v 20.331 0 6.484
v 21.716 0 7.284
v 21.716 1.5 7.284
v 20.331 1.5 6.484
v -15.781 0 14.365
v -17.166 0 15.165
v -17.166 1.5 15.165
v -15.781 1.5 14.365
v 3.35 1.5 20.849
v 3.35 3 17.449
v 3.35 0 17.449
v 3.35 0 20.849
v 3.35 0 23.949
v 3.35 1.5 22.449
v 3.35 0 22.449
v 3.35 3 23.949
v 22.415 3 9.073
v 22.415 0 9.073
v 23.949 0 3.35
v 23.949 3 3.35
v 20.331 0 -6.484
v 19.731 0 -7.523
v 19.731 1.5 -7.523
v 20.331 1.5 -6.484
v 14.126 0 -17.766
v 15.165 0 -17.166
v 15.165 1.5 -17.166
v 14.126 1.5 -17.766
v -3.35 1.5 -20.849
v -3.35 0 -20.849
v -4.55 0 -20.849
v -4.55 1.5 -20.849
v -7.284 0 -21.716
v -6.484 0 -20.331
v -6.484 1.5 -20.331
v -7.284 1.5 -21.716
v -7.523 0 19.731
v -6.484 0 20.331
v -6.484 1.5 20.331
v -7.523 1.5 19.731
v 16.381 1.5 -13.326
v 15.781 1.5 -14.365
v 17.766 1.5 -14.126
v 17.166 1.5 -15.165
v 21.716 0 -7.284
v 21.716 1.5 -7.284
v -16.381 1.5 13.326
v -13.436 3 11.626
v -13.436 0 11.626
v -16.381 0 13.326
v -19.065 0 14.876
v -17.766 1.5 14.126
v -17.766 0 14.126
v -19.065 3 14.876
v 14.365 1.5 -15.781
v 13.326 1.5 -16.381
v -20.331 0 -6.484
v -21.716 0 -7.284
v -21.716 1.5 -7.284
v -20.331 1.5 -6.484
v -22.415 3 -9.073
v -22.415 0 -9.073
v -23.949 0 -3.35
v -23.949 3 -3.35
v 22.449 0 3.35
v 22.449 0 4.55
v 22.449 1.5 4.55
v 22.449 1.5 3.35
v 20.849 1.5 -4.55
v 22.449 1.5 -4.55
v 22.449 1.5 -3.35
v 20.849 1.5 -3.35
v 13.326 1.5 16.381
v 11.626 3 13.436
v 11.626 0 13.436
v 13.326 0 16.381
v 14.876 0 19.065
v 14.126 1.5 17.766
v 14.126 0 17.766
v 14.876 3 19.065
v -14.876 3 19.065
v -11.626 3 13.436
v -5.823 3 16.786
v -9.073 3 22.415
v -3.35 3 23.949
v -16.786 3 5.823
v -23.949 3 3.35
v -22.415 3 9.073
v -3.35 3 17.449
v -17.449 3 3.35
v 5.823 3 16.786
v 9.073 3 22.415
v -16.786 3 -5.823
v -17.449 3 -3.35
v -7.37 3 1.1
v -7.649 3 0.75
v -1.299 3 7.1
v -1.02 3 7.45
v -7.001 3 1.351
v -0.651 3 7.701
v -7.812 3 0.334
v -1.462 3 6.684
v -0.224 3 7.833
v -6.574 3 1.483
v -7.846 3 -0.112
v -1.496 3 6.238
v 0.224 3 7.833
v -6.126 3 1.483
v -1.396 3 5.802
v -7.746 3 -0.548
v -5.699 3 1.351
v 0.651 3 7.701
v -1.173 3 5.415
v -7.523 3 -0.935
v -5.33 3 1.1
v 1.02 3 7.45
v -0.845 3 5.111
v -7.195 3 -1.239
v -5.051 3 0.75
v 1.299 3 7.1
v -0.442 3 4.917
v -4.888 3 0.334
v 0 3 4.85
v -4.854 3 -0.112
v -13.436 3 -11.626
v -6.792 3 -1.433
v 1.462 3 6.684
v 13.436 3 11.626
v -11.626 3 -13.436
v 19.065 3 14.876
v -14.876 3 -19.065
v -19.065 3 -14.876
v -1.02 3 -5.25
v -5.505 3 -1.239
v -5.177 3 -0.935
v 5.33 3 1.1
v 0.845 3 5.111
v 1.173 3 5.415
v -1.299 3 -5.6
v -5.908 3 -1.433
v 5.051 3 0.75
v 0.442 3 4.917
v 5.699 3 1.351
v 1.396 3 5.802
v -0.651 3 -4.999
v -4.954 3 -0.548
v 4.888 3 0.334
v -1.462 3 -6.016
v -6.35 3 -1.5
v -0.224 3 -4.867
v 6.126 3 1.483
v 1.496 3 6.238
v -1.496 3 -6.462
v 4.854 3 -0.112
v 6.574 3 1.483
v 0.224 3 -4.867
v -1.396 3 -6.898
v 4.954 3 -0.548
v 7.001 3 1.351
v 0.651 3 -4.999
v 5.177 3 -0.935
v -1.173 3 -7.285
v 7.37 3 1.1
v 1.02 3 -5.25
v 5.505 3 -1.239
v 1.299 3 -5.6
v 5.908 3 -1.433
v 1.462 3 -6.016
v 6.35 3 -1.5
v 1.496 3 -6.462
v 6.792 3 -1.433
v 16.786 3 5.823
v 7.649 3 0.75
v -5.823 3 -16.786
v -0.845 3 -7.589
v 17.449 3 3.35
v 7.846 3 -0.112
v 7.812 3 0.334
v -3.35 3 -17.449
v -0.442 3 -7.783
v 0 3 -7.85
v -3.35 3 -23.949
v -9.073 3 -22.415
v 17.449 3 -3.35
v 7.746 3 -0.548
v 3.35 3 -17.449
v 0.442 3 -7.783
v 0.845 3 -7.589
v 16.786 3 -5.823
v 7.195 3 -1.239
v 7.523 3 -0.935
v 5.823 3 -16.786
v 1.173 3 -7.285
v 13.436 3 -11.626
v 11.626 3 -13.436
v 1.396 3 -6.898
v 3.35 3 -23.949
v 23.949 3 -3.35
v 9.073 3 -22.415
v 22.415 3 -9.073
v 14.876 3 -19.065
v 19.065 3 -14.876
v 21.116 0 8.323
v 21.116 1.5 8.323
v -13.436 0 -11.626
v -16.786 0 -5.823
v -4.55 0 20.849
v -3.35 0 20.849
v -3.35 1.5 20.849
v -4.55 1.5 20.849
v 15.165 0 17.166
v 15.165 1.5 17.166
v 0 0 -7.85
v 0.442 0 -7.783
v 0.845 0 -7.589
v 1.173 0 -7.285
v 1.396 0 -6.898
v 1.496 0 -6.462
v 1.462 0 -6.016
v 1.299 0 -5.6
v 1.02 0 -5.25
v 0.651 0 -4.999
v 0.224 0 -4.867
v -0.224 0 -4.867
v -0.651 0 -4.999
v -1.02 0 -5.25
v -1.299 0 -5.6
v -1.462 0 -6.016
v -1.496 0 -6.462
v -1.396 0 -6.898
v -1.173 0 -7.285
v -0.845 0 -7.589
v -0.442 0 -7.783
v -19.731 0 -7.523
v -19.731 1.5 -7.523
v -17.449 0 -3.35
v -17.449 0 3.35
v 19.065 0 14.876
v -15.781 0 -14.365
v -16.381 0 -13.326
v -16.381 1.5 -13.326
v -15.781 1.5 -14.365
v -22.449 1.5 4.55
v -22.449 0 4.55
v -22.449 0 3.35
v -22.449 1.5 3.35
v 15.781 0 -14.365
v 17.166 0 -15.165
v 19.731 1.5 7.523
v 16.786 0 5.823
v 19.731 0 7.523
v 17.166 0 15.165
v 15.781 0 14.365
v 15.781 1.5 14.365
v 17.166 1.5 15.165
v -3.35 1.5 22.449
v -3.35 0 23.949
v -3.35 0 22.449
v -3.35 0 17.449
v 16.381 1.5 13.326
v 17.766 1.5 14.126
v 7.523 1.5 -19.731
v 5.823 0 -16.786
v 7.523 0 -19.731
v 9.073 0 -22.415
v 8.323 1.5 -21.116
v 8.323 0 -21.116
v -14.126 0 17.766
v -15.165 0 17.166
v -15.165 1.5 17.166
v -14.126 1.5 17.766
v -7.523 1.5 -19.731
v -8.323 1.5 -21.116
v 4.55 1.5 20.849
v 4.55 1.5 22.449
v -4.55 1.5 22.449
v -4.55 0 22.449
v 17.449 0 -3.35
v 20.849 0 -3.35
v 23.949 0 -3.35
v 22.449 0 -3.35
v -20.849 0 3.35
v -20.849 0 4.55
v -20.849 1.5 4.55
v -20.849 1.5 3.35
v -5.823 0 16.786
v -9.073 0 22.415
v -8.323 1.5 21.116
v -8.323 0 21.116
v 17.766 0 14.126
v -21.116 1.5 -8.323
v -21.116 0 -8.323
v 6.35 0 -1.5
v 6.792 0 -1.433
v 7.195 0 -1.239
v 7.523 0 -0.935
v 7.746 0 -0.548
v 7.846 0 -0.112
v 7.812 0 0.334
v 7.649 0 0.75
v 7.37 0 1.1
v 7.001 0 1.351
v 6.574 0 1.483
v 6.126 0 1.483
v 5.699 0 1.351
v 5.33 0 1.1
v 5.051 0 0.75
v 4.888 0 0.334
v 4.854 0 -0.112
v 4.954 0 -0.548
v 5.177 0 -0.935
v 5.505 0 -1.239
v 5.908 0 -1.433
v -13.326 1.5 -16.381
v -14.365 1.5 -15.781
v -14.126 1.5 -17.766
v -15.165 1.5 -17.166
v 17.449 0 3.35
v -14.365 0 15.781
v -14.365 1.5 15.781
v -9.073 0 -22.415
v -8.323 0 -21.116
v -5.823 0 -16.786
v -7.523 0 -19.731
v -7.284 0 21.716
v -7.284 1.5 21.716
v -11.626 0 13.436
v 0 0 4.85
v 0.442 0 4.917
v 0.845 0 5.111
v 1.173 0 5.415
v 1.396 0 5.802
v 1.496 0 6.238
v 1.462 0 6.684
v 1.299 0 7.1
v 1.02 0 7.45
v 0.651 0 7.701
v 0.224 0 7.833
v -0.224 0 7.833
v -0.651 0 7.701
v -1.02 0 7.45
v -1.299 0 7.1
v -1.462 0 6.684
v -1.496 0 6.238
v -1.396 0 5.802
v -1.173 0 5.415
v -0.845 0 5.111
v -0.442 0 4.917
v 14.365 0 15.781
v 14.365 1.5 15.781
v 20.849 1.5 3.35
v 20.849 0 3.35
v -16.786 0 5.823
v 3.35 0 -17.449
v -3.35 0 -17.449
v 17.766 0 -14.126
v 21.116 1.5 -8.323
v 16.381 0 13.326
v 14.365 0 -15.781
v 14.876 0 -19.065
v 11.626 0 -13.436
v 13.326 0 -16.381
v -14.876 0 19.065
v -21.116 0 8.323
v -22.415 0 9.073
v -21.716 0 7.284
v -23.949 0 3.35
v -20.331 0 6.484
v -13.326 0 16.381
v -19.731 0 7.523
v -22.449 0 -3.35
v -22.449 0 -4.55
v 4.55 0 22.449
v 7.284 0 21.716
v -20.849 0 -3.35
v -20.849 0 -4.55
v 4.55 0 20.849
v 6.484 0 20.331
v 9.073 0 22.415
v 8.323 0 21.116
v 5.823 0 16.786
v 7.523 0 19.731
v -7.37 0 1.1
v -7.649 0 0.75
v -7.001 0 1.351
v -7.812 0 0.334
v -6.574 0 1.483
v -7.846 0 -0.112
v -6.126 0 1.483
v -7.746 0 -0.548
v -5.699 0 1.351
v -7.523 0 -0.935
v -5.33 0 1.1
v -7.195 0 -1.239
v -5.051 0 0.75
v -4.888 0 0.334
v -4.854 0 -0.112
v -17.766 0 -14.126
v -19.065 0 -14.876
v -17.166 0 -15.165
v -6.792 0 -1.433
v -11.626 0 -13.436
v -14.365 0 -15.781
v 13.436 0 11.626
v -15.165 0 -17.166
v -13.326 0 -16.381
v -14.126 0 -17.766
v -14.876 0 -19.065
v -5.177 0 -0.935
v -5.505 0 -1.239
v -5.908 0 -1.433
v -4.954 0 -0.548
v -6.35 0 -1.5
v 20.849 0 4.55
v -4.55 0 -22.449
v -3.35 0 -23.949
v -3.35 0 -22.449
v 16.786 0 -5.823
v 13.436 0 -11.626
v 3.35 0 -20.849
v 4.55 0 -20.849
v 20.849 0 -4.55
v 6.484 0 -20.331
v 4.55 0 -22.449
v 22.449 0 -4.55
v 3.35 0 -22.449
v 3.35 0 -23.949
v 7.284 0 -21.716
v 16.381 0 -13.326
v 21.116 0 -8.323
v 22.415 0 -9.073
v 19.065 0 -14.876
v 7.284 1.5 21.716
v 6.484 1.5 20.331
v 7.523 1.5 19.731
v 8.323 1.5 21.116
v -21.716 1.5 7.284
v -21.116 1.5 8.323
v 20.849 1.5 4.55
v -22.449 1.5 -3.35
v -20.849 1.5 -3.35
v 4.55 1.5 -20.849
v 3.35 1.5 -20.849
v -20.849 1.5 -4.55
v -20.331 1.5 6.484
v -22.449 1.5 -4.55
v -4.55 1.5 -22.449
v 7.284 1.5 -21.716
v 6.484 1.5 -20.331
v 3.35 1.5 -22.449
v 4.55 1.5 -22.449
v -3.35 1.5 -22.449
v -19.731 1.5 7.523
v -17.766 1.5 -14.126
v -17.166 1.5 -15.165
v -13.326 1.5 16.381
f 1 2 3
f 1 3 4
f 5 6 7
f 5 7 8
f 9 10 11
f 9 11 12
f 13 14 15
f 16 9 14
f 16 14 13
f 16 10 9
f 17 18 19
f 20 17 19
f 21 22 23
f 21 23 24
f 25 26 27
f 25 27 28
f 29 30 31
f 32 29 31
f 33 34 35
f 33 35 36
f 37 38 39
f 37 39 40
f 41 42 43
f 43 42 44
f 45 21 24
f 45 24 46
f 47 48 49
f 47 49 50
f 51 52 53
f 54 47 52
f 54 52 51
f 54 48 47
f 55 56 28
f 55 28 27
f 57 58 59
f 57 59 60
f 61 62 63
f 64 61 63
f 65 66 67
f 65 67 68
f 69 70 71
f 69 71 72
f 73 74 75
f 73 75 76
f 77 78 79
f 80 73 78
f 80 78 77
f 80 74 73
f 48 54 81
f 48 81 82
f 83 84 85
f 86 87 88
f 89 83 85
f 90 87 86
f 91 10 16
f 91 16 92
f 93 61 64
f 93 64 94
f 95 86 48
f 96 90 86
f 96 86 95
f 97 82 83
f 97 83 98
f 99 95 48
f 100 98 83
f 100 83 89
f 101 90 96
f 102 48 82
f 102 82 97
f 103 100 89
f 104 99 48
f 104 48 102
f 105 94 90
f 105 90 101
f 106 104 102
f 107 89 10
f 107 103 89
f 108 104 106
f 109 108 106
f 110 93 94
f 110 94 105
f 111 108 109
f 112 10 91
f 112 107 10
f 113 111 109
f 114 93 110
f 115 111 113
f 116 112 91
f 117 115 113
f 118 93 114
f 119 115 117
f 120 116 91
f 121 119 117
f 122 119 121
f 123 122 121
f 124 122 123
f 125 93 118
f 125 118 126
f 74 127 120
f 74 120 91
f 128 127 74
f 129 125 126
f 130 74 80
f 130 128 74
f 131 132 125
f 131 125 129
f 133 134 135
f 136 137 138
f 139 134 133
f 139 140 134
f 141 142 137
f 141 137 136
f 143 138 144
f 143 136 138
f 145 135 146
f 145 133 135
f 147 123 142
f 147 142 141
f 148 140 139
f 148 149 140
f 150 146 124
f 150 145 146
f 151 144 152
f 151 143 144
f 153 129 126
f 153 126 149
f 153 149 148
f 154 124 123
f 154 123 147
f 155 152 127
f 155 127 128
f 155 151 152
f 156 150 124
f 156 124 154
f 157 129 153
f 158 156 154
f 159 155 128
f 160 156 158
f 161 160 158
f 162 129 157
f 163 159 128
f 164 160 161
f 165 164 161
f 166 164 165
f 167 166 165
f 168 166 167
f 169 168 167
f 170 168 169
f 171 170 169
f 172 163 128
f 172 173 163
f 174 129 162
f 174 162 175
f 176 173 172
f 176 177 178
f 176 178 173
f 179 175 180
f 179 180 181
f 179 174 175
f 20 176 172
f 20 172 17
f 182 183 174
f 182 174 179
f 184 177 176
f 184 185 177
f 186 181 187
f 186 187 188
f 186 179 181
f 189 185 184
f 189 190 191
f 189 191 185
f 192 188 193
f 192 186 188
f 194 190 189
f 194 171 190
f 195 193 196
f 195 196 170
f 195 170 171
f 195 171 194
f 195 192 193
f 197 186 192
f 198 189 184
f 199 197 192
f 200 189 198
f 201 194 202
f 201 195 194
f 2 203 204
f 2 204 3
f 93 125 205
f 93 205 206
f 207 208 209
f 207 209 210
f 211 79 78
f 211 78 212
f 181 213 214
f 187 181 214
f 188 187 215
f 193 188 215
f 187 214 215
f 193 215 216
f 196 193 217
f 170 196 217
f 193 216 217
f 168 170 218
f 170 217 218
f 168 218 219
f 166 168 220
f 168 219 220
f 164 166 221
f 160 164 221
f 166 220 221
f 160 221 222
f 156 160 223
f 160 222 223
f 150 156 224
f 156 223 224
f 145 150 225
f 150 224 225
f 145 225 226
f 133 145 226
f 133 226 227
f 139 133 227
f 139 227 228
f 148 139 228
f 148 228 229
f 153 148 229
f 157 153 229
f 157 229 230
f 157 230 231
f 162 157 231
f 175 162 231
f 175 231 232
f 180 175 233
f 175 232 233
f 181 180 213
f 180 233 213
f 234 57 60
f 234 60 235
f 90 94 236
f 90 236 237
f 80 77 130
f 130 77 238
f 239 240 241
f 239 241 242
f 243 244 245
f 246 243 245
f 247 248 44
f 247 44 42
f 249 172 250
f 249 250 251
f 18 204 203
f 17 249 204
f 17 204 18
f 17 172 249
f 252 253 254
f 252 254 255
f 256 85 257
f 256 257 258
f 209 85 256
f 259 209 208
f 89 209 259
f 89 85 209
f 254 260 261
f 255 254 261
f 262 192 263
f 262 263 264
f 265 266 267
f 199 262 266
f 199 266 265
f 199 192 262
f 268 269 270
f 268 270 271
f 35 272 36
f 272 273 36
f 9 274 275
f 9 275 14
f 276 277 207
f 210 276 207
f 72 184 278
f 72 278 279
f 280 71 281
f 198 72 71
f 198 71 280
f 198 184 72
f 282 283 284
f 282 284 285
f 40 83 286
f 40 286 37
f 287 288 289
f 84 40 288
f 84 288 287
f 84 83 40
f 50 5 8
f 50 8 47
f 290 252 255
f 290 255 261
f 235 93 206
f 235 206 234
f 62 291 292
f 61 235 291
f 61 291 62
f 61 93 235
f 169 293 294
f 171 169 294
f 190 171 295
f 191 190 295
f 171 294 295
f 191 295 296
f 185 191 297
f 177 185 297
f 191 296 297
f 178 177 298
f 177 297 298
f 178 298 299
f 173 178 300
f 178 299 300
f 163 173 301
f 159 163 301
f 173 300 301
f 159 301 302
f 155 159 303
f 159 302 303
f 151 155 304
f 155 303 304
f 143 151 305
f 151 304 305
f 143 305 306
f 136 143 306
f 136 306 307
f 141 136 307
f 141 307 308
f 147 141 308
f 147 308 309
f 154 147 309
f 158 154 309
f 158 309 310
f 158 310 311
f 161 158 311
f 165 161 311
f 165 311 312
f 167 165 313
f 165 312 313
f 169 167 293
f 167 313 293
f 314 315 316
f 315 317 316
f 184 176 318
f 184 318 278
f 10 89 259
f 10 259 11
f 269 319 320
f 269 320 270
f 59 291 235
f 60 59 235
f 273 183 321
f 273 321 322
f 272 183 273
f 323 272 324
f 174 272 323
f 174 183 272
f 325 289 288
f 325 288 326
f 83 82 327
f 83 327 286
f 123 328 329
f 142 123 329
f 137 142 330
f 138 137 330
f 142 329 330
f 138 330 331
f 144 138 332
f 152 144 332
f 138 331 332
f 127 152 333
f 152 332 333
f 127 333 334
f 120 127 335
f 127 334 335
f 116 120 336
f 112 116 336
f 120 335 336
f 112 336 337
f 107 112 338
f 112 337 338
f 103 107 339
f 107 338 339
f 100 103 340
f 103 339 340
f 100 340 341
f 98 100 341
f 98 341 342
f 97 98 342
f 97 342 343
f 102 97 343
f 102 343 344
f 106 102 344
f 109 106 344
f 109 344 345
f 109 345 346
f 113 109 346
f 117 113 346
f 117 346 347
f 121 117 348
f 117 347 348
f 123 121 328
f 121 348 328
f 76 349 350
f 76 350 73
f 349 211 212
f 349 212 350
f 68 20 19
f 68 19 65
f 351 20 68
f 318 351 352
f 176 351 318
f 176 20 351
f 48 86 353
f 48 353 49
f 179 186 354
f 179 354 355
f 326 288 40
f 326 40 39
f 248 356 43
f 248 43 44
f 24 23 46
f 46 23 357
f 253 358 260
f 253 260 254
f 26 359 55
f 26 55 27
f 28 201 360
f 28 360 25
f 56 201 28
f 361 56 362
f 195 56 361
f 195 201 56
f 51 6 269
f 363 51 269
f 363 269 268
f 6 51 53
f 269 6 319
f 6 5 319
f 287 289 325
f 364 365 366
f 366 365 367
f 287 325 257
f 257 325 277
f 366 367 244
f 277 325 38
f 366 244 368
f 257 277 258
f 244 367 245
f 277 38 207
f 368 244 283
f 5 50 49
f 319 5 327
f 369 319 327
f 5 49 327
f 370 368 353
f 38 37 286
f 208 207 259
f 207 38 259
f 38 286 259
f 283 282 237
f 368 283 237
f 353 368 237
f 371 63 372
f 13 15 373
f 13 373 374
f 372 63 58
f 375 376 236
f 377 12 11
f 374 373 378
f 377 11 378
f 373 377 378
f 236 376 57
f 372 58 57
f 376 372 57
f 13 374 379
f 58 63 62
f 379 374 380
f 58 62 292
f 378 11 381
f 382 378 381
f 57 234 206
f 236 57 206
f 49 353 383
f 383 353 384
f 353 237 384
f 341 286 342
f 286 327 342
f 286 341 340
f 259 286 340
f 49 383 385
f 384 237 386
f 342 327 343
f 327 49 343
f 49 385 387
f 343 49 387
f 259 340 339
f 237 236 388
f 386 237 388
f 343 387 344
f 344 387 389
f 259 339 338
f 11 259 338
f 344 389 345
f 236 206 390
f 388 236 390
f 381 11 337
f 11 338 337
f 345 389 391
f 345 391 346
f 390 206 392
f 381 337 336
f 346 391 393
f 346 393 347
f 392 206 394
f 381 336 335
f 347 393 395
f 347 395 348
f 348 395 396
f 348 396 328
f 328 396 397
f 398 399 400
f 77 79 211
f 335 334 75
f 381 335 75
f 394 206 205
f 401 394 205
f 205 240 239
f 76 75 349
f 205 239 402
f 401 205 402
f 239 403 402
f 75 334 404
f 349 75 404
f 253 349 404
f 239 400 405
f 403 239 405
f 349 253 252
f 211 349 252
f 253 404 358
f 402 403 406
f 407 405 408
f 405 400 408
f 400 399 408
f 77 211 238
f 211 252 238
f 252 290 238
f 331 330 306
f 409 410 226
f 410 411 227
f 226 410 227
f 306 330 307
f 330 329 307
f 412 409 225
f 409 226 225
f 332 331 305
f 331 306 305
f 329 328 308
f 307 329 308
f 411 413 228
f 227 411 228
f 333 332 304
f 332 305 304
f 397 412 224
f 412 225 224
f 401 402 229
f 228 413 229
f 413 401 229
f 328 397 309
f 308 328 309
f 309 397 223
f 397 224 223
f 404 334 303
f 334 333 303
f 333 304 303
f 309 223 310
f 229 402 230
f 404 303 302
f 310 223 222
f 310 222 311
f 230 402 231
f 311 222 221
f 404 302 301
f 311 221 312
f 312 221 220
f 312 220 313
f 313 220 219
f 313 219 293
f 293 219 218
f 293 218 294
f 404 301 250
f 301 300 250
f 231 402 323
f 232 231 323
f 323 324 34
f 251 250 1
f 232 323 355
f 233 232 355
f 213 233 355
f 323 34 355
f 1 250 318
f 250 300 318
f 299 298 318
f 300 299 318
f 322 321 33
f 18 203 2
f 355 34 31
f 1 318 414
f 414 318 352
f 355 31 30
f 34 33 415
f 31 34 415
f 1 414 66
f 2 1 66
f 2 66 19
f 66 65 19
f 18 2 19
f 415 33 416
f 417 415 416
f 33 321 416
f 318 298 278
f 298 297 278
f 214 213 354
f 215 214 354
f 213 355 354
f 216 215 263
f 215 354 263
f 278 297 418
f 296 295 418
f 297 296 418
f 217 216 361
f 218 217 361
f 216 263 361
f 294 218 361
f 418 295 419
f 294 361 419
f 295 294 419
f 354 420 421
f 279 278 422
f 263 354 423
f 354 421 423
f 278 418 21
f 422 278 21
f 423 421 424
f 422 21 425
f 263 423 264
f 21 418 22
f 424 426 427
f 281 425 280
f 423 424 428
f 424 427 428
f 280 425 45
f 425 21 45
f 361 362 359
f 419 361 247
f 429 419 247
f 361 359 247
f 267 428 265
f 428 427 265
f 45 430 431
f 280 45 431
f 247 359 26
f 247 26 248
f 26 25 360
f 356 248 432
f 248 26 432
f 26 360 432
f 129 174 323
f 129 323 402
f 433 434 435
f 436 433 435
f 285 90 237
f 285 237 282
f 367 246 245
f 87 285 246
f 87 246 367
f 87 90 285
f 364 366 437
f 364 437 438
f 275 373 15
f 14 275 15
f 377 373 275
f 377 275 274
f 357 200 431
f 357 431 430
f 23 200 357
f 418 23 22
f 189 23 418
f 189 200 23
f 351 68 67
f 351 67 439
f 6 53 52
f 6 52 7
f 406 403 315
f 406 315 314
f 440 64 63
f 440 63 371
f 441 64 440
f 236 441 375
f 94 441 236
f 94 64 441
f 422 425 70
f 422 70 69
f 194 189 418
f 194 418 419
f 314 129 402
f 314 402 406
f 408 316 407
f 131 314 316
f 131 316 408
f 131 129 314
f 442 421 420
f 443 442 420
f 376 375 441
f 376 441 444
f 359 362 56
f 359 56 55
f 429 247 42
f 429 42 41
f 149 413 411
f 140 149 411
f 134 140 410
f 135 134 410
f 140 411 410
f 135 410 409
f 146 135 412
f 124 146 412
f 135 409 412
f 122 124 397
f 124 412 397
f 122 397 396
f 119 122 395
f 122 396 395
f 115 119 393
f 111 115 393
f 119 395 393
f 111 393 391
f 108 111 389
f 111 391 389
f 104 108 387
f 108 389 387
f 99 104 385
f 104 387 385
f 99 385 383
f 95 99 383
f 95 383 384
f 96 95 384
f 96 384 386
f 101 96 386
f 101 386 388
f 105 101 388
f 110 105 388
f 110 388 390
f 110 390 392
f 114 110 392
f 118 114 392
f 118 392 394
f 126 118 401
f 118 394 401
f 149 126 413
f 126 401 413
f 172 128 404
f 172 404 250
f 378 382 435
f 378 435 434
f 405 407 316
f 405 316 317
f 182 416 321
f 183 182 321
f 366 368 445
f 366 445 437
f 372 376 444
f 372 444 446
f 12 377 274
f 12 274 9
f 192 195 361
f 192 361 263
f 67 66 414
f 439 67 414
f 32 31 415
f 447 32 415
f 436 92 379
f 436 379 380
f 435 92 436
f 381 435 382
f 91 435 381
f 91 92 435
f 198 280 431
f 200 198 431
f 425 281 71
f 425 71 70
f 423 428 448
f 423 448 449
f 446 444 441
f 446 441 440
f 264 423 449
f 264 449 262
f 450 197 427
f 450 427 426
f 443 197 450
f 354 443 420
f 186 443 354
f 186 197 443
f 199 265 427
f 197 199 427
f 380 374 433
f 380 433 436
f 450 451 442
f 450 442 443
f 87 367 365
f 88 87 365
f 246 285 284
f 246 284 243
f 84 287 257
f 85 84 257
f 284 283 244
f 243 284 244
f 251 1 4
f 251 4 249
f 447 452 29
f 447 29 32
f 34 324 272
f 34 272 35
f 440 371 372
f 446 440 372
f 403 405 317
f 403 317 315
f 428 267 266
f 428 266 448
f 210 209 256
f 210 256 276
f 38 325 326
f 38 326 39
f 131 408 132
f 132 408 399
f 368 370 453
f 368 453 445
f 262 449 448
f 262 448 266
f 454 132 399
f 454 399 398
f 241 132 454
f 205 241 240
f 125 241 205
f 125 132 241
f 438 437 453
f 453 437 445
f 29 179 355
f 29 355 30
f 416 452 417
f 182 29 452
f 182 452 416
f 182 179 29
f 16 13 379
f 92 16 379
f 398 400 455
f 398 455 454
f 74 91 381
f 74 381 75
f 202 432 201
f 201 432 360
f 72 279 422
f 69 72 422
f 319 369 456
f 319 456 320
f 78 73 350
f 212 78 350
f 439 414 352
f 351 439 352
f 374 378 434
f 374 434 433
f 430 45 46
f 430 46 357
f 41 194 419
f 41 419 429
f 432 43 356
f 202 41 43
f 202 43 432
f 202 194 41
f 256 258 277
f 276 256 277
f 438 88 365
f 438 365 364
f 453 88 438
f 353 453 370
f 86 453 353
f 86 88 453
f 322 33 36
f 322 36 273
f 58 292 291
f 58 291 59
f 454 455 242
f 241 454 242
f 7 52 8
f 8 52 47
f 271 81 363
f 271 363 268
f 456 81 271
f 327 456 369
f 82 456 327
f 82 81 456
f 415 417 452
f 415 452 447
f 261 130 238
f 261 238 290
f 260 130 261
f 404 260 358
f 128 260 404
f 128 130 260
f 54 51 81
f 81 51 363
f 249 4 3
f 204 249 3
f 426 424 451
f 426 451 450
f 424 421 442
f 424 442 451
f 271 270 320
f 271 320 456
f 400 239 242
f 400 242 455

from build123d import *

# Parameters (mm, degrees)
BOSS_EXTRUDE1_DEPTH = 3
CUT_EXTRUDE1_DEPTH  = 3
SKETCH4_W           = 9.1
SKETCH4_H           = 1.6
SKETCH4_W_2         = 1.6
SKETCH4_H_2         = 9.1
CUT_EXTRUDE2_DEPTH  = 1.5
SKETCH7_R           = 1.5
CUT_EXTRUDE4_DEPTH  = 3


with BuildPart() as part:
    # Sketch2 → Boss-Extrude1 (new body)
    with BuildSketch(Plane(origin=(0, 0, 0), x_dir=(1, 0, 0), z_dir=(0, 1, 0))):
        Polygon((0, 24.84662833), (-12.423314165, 21.517811332), (-21.517811332, 12.423314165), (-24.84662833, 0), (-21.517811332, -12.423314165), (-12.423314165, -21.517811332), (0, -24.84662833), (12.423314165, -21.517811332), (21.517811332, -12.423314165), (24.84662833, 0), (21.517811332, 12.423314165), (12.423314165, 21.517811332), align=None)
    extrude(amount=BOSS_EXTRUDE1_DEPTH)

    # Sketch3 → Cut-Extrude1 (cut)
    with BuildSketch(Plane(origin=(0, 3, 0), x_dir=(1, 0, 0), z_dir=(0, 1, 0))):
        Polygon((-3.35, 23.948998535), (0, 24.84662833), (3.35, 23.948998535), (3.35, 17.448998535), (-3.35, 17.448998535), align=None)
        Polygon((5.823314165, 16.786276002), (9.073314165, 22.415441127), (12.423314165, 21.517811332), (14.87568437, 19.065441127), (11.62568437, 13.436276002), align=None)
        Polygon((13.436276002, 11.62568437), (19.065441127, 14.87568437), (21.517811332, 12.423314165), (22.415441127, 9.073314165), (16.786276002, 5.823314165), align=None)
        Polygon((17.448998535, 3.35), (23.948998535, 3.35), (24.84662833, 0), (23.948998535, -3.35), (17.448998535, -3.35), align=None)
        Polygon((16.786276002, -5.823314165), (22.415441127, -9.073314165), (21.517811332, -12.423314165), (19.065441127, -14.87568437), (13.436276002, -11.62568437), align=None)
        Polygon((11.62568437, -13.436276002), (14.87568437, -19.065441127), (12.423314165, -21.517811332), (9.073314165, -22.415441127), (5.823314165, -16.786276002), align=None)
        Polygon((3.35, -17.448998535), (3.35, -23.948998535), (0, -24.84662833), (-3.35, -23.948998535), (-3.35, -17.448998535), align=None)
        Polygon((-5.823314165, -16.786276002), (-9.073314165, -22.415441127), (-12.423314165, -21.517811332), (-14.87568437, -19.065441127), (-11.62568437, -13.436276002), align=None)
        Polygon((-13.436276002, -11.62568437), (-19.065441127, -14.87568437), (-21.517811332, -12.423314165), (-22.415441127, -9.073314165), (-16.786276002, -5.823314165), align=None)
        Polygon((-17.448998535, -3.35), (-23.948998535, -3.35), (-24.84662833, 0), (-23.948998535, 3.35), (-17.448998535, 3.35), align=None)
        Polygon((-16.786276002, 5.823314165), (-22.415441127, 9.073314165), (-21.517811332, 12.423314165), (-19.065441127, 14.87568437), (-13.436276002, 11.62568437), align=None)
        Polygon((-11.62568437, 13.436276002), (-14.87568437, 19.065441127), (-12.423314165, 21.517811332), (-9.073314165, 22.415441127), (-5.823314165, 16.786276002), align=None)
    extrude(amount=-CUT_EXTRUDE1_DEPTH, mode=Mode.SUBTRACT)

    # Sketch4 → Cut-Extrude2 (cut)
    with BuildSketch(Plane(origin=(0, 0, 0), x_dir=(-1, 0, 0), z_dir=(0, -1, 0))):
        with Locations((0, -21.648998535)):
            Rectangle(SKETCH4_W, SKETCH4_H)
        Polygon((-6.48408368, -20.330762375), (-7.28408368, -21.716403021), (-15.164914855, -17.166403021), (-14.364914855, -15.780762375), align=None)
        Polygon((-15.780762375, -14.364914855), (-17.166403021, -15.164914855), (-21.716403021, -7.28408368), (-20.330762375, -6.48408368), align=None)
        with Locations((-21.648998535, 0)):
            Rectangle(SKETCH4_W_2, SKETCH4_H_2)
        Polygon((-20.330762375, 6.48408368), (-21.716403021, 7.28408368), (-17.166403021, 15.164914855), (-15.780762375, 14.364914855), align=None)
        Polygon((-14.364914855, 15.780762375), (-15.164914855, 17.166403021), (-7.28408368, 21.716403021), (-6.48408368, 20.330762375), align=None)
        with Locations((0, 21.648998535)):
            Rectangle(SKETCH4_W, SKETCH4_H)
        Polygon((6.48408368, 20.330762375), (7.28408368, 21.716403021), (15.164914855, 17.166403021), (14.364914855, 15.780762375), align=None)
        Polygon((15.780762375, 14.364914855), (17.166403021, 15.164914855), (21.716403021, 7.28408368), (20.330762375, 6.48408368), align=None)
        with Locations((21.648998535, 0)):
            Rectangle(SKETCH4_W_2, SKETCH4_H_2)
        Polygon((20.330762375, -6.48408368), (21.716403021, -7.28408368), (17.166403021, -15.164914855), (15.780762375, -14.364914855), align=None)
        Polygon((14.364914855, -15.780762375), (15.164914855, -17.166403021), (7.28408368, -21.716403021), (6.48408368, -20.330762375), align=None)
    extrude(amount=-CUT_EXTRUDE2_DEPTH, mode=Mode.SUBTRACT)

    # Sketch7 → Cut-Extrude4 (cut)
    with BuildSketch(Plane.XZ):
        with Locations(Location((0, 6.35, 0), (0, 0, 270))):
            Circle(SKETCH7_R)
        with Locations(Location((6.35, 0, 0), (0, 0, 270))):
            Circle(SKETCH7_R)
        with Locations(Location((0, -6.35, 0), (0, 0, 270))):
            Circle(SKETCH7_R)
        with Locations(Location((-6.35, 0, 0), (0, 0, 270))):
            Circle(SKETCH7_R)
    extrude(amount=-CUT_EXTRUDE4_DEPTH, mode=Mode.SUBTRACT)


solid = part.part
